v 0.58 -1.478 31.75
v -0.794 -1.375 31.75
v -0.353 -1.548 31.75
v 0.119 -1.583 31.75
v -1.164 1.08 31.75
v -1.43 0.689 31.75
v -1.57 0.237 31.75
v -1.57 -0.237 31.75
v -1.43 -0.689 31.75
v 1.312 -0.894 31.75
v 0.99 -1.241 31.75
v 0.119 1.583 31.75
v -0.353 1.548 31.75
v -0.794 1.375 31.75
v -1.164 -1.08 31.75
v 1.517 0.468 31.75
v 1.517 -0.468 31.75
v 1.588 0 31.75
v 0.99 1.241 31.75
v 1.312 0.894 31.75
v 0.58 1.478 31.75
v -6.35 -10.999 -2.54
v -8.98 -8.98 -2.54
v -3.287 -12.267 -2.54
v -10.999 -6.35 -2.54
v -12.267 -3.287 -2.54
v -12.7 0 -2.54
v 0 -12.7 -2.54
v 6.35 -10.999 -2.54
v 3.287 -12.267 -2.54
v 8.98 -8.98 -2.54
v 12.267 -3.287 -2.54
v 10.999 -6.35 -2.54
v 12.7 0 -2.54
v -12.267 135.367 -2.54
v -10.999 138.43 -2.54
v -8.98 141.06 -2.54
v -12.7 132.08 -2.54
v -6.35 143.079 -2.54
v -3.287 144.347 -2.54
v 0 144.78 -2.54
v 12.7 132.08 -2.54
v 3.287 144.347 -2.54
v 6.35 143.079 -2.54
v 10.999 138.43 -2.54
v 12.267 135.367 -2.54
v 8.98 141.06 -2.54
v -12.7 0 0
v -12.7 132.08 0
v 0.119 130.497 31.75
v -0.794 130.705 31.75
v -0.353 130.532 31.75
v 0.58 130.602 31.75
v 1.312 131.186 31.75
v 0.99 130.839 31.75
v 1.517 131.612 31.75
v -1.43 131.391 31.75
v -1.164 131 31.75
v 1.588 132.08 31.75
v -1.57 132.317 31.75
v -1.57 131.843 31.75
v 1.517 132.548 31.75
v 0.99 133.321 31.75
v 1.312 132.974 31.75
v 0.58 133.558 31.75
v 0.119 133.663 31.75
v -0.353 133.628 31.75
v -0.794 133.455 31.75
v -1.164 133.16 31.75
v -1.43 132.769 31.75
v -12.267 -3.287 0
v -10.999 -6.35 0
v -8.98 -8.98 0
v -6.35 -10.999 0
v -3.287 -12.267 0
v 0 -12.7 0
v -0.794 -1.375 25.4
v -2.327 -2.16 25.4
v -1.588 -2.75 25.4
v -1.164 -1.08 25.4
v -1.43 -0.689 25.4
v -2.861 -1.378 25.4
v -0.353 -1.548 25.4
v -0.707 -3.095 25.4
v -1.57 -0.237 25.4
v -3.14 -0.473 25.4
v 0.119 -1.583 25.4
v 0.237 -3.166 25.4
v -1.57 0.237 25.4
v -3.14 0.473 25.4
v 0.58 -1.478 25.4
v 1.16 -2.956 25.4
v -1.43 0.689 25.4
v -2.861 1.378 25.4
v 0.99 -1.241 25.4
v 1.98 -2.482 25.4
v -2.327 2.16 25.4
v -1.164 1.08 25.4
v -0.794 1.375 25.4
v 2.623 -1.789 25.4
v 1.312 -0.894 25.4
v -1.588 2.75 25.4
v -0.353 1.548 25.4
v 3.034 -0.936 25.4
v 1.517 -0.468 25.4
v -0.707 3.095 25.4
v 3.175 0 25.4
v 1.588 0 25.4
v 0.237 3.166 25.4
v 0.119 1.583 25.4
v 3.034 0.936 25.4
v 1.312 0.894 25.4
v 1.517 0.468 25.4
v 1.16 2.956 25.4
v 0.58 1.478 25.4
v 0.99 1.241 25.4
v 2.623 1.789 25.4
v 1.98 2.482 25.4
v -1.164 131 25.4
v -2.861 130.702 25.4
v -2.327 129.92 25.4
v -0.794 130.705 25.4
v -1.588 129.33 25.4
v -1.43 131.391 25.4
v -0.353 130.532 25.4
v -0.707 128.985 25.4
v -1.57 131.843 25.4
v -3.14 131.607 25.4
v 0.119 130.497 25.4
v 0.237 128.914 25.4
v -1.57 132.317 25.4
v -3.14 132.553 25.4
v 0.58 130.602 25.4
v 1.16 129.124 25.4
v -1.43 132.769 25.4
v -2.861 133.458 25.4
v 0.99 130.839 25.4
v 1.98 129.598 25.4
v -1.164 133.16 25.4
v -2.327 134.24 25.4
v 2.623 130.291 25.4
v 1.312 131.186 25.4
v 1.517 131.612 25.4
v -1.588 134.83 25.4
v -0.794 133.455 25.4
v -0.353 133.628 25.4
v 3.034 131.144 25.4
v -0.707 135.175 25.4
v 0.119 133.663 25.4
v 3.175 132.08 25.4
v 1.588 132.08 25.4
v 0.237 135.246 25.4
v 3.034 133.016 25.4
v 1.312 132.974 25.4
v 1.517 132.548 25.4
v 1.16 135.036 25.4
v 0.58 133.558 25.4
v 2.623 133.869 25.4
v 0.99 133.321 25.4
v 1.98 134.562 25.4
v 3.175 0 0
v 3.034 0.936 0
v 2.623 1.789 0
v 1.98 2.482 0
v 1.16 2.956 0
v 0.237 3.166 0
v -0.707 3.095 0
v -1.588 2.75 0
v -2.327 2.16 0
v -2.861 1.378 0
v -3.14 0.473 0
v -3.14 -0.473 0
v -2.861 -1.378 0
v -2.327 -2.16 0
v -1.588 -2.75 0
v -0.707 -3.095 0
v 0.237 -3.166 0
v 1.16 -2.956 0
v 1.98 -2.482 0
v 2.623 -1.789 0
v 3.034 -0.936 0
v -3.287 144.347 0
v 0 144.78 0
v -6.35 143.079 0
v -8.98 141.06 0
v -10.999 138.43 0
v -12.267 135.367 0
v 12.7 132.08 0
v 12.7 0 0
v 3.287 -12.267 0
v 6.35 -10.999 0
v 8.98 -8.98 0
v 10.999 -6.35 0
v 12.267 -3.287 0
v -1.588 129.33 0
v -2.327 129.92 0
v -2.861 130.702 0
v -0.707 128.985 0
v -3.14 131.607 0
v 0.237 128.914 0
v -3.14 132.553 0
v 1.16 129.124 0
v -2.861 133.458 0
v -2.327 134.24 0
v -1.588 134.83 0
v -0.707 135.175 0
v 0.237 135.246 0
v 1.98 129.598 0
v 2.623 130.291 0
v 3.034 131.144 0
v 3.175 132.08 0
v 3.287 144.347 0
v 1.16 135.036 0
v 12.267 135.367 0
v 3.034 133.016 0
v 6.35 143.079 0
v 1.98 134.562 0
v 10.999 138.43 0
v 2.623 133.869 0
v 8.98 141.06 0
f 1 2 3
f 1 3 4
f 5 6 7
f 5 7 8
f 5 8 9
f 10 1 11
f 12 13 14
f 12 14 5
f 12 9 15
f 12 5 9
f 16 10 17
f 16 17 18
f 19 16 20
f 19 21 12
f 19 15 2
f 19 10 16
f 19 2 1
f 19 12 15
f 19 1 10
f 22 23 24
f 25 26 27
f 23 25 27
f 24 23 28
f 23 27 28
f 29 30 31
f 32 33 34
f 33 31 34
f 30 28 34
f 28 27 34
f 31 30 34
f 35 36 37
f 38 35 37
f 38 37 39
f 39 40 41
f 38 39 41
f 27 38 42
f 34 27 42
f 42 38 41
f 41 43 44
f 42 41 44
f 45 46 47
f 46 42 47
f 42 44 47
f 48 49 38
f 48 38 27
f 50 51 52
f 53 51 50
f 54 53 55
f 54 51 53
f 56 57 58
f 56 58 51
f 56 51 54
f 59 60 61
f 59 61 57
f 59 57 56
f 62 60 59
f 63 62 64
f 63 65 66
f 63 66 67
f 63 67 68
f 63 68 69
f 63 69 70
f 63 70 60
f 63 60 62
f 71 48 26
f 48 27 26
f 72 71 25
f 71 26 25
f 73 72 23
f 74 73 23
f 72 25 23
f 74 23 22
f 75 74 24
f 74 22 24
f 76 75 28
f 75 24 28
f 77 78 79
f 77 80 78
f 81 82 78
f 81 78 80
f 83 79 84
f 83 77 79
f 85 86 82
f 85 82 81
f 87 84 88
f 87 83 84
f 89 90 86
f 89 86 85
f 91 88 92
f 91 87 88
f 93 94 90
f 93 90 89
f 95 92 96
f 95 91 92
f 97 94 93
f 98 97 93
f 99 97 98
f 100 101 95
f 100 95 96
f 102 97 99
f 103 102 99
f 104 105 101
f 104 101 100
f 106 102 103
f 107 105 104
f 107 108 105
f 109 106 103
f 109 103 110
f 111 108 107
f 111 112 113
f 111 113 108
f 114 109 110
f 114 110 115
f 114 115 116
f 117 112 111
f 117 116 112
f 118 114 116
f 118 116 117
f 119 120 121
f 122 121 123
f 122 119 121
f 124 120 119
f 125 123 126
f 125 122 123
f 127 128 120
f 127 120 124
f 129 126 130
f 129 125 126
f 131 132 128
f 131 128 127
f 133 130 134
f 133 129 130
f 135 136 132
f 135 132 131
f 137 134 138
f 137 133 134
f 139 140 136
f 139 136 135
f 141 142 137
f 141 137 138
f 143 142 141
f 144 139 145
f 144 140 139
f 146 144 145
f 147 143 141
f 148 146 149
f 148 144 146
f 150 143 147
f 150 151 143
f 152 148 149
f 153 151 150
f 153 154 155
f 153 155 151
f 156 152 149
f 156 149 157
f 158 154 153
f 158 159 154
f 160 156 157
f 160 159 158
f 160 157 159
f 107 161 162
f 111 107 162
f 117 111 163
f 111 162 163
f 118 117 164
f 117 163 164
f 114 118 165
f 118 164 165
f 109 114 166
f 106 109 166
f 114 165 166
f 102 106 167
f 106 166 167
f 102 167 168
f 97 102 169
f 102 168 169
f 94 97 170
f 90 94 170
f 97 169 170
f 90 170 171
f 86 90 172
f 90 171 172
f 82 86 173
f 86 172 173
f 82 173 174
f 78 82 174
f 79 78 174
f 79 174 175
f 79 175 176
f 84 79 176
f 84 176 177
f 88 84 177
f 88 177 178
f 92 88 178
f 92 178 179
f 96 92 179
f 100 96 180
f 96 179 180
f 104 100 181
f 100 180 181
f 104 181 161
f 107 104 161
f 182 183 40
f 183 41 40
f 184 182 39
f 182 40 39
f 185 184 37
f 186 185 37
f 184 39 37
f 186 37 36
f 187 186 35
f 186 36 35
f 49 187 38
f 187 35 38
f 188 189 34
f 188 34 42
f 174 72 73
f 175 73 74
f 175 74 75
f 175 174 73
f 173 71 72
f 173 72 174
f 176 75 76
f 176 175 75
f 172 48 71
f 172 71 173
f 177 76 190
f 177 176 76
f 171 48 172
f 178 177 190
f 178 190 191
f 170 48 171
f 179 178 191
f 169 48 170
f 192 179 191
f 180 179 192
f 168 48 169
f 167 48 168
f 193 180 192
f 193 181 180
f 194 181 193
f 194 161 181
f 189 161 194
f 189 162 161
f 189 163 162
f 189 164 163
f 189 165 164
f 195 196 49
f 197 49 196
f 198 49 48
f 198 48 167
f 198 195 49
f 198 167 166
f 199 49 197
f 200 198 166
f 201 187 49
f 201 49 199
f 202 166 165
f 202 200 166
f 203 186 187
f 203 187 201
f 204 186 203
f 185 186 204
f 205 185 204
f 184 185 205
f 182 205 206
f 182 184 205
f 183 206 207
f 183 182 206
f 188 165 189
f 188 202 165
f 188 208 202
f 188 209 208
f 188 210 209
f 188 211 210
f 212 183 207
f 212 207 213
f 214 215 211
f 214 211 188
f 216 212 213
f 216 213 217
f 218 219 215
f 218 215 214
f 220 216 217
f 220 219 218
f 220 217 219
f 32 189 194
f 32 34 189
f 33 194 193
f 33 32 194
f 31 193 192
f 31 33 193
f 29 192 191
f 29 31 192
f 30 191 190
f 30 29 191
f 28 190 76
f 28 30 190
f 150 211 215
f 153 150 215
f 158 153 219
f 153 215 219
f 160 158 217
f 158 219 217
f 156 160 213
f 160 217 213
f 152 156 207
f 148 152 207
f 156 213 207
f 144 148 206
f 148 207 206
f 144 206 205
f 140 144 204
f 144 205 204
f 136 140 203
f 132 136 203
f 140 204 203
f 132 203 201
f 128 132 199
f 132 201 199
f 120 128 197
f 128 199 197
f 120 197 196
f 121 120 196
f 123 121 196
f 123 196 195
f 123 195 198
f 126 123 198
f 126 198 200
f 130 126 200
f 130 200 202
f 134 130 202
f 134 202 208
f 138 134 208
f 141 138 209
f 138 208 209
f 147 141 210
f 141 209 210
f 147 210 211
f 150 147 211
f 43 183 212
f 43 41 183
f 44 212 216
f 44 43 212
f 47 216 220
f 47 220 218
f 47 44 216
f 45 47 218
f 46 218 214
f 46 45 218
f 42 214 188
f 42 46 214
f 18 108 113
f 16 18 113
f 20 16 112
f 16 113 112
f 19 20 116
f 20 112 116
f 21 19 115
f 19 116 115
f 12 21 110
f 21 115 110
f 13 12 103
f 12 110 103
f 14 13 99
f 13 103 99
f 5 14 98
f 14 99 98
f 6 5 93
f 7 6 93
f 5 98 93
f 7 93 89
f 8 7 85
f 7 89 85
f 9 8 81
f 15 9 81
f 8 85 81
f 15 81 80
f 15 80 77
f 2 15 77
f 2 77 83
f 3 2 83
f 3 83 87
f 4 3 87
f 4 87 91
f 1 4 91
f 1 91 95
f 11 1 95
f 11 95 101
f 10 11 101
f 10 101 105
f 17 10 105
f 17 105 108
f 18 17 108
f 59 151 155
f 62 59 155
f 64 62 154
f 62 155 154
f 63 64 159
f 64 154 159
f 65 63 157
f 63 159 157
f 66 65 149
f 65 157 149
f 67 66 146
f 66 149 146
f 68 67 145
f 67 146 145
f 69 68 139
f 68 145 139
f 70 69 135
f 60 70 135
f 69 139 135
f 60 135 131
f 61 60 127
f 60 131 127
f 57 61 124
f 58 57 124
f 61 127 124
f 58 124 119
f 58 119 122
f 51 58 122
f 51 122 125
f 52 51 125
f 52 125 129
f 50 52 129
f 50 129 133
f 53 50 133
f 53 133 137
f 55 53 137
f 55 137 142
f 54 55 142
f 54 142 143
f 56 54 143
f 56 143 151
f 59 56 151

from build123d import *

# Parameters (mm, degrees)
F0_R     = 3.175
F0_R_2   = 1.5875
F1_DEPTH = 2.54
F2_DEPTH = 25.4
F3_R     = 12.69999
F4_DEPTH = 31.75


# Not quite as in the source:
# - a fillet or chamfer is up to 0.001 mm smaller than in the source, because OpenCascade refuses the exact size


with BuildPart() as f1:
    # F0 (on Top) → F1 (new body)
    with BuildSketch(Plane.XY):
        Polygon((12.7, 144.78), (0, 144.78), (-12.7, 144.78), (-12.7, -12.7), (0, -12.7), (12.7, -12.7), align=None)
        Circle(F0_R, mode=Mode.SUBTRACT)
        with Locations((0, 132.08)):
            Circle(F0_R, mode=Mode.SUBTRACT)
        with Locations((0, 132.08)):
            Circle(F0_R)
        with Locations((0, 132.08)):
            Circle(F0_R_2, mode=Mode.SUBTRACT)
        with Locations((0, 132.08)):
            Circle(F0_R_2)
        Circle(F0_R)
        Circle(F0_R_2, mode=Mode.SUBTRACT)
        Circle(F0_R_2)
    extrude(amount=-F1_DEPTH)

    # F0 (on Top) → F2 (join)
    with BuildSketch(Plane.XY):
        with Locations((0, 132.08)):
            Circle(F0_R)
        with Locations((0, 132.08)):
            Circle(F0_R_2, mode=Mode.SUBTRACT)
        Circle(F0_R)
        Circle(F0_R_2, mode=Mode.SUBTRACT)
        with Locations((0, 132.08)):
            Circle(F0_R_2)
        Circle(F0_R_2)
    extrude(amount=F2_DEPTH)

    # F3 (radius 12.7 in the source; OpenCascade refuses exactly that, so slightly less here)
    f3_edges = [f1.edges().sort_by_distance(p)[0] for p in [
        (12.7, 144.78, -1.27),
        (-12.7, 144.78, -1.27),
        (-12.7, -12.7, -1.27),
        (12.7, -12.7, -1.27),
    ]]
    fillet(f3_edges, radius=F3_R)

    # F0 (on Top) → F4 (join)
    with BuildSketch(Plane.XY):
        Circle(F0_R_2)
        with Locations((0, 132.08)):
            Circle(F0_R_2)
    extrude(amount=F4_DEPTH)


solid = f1.part
